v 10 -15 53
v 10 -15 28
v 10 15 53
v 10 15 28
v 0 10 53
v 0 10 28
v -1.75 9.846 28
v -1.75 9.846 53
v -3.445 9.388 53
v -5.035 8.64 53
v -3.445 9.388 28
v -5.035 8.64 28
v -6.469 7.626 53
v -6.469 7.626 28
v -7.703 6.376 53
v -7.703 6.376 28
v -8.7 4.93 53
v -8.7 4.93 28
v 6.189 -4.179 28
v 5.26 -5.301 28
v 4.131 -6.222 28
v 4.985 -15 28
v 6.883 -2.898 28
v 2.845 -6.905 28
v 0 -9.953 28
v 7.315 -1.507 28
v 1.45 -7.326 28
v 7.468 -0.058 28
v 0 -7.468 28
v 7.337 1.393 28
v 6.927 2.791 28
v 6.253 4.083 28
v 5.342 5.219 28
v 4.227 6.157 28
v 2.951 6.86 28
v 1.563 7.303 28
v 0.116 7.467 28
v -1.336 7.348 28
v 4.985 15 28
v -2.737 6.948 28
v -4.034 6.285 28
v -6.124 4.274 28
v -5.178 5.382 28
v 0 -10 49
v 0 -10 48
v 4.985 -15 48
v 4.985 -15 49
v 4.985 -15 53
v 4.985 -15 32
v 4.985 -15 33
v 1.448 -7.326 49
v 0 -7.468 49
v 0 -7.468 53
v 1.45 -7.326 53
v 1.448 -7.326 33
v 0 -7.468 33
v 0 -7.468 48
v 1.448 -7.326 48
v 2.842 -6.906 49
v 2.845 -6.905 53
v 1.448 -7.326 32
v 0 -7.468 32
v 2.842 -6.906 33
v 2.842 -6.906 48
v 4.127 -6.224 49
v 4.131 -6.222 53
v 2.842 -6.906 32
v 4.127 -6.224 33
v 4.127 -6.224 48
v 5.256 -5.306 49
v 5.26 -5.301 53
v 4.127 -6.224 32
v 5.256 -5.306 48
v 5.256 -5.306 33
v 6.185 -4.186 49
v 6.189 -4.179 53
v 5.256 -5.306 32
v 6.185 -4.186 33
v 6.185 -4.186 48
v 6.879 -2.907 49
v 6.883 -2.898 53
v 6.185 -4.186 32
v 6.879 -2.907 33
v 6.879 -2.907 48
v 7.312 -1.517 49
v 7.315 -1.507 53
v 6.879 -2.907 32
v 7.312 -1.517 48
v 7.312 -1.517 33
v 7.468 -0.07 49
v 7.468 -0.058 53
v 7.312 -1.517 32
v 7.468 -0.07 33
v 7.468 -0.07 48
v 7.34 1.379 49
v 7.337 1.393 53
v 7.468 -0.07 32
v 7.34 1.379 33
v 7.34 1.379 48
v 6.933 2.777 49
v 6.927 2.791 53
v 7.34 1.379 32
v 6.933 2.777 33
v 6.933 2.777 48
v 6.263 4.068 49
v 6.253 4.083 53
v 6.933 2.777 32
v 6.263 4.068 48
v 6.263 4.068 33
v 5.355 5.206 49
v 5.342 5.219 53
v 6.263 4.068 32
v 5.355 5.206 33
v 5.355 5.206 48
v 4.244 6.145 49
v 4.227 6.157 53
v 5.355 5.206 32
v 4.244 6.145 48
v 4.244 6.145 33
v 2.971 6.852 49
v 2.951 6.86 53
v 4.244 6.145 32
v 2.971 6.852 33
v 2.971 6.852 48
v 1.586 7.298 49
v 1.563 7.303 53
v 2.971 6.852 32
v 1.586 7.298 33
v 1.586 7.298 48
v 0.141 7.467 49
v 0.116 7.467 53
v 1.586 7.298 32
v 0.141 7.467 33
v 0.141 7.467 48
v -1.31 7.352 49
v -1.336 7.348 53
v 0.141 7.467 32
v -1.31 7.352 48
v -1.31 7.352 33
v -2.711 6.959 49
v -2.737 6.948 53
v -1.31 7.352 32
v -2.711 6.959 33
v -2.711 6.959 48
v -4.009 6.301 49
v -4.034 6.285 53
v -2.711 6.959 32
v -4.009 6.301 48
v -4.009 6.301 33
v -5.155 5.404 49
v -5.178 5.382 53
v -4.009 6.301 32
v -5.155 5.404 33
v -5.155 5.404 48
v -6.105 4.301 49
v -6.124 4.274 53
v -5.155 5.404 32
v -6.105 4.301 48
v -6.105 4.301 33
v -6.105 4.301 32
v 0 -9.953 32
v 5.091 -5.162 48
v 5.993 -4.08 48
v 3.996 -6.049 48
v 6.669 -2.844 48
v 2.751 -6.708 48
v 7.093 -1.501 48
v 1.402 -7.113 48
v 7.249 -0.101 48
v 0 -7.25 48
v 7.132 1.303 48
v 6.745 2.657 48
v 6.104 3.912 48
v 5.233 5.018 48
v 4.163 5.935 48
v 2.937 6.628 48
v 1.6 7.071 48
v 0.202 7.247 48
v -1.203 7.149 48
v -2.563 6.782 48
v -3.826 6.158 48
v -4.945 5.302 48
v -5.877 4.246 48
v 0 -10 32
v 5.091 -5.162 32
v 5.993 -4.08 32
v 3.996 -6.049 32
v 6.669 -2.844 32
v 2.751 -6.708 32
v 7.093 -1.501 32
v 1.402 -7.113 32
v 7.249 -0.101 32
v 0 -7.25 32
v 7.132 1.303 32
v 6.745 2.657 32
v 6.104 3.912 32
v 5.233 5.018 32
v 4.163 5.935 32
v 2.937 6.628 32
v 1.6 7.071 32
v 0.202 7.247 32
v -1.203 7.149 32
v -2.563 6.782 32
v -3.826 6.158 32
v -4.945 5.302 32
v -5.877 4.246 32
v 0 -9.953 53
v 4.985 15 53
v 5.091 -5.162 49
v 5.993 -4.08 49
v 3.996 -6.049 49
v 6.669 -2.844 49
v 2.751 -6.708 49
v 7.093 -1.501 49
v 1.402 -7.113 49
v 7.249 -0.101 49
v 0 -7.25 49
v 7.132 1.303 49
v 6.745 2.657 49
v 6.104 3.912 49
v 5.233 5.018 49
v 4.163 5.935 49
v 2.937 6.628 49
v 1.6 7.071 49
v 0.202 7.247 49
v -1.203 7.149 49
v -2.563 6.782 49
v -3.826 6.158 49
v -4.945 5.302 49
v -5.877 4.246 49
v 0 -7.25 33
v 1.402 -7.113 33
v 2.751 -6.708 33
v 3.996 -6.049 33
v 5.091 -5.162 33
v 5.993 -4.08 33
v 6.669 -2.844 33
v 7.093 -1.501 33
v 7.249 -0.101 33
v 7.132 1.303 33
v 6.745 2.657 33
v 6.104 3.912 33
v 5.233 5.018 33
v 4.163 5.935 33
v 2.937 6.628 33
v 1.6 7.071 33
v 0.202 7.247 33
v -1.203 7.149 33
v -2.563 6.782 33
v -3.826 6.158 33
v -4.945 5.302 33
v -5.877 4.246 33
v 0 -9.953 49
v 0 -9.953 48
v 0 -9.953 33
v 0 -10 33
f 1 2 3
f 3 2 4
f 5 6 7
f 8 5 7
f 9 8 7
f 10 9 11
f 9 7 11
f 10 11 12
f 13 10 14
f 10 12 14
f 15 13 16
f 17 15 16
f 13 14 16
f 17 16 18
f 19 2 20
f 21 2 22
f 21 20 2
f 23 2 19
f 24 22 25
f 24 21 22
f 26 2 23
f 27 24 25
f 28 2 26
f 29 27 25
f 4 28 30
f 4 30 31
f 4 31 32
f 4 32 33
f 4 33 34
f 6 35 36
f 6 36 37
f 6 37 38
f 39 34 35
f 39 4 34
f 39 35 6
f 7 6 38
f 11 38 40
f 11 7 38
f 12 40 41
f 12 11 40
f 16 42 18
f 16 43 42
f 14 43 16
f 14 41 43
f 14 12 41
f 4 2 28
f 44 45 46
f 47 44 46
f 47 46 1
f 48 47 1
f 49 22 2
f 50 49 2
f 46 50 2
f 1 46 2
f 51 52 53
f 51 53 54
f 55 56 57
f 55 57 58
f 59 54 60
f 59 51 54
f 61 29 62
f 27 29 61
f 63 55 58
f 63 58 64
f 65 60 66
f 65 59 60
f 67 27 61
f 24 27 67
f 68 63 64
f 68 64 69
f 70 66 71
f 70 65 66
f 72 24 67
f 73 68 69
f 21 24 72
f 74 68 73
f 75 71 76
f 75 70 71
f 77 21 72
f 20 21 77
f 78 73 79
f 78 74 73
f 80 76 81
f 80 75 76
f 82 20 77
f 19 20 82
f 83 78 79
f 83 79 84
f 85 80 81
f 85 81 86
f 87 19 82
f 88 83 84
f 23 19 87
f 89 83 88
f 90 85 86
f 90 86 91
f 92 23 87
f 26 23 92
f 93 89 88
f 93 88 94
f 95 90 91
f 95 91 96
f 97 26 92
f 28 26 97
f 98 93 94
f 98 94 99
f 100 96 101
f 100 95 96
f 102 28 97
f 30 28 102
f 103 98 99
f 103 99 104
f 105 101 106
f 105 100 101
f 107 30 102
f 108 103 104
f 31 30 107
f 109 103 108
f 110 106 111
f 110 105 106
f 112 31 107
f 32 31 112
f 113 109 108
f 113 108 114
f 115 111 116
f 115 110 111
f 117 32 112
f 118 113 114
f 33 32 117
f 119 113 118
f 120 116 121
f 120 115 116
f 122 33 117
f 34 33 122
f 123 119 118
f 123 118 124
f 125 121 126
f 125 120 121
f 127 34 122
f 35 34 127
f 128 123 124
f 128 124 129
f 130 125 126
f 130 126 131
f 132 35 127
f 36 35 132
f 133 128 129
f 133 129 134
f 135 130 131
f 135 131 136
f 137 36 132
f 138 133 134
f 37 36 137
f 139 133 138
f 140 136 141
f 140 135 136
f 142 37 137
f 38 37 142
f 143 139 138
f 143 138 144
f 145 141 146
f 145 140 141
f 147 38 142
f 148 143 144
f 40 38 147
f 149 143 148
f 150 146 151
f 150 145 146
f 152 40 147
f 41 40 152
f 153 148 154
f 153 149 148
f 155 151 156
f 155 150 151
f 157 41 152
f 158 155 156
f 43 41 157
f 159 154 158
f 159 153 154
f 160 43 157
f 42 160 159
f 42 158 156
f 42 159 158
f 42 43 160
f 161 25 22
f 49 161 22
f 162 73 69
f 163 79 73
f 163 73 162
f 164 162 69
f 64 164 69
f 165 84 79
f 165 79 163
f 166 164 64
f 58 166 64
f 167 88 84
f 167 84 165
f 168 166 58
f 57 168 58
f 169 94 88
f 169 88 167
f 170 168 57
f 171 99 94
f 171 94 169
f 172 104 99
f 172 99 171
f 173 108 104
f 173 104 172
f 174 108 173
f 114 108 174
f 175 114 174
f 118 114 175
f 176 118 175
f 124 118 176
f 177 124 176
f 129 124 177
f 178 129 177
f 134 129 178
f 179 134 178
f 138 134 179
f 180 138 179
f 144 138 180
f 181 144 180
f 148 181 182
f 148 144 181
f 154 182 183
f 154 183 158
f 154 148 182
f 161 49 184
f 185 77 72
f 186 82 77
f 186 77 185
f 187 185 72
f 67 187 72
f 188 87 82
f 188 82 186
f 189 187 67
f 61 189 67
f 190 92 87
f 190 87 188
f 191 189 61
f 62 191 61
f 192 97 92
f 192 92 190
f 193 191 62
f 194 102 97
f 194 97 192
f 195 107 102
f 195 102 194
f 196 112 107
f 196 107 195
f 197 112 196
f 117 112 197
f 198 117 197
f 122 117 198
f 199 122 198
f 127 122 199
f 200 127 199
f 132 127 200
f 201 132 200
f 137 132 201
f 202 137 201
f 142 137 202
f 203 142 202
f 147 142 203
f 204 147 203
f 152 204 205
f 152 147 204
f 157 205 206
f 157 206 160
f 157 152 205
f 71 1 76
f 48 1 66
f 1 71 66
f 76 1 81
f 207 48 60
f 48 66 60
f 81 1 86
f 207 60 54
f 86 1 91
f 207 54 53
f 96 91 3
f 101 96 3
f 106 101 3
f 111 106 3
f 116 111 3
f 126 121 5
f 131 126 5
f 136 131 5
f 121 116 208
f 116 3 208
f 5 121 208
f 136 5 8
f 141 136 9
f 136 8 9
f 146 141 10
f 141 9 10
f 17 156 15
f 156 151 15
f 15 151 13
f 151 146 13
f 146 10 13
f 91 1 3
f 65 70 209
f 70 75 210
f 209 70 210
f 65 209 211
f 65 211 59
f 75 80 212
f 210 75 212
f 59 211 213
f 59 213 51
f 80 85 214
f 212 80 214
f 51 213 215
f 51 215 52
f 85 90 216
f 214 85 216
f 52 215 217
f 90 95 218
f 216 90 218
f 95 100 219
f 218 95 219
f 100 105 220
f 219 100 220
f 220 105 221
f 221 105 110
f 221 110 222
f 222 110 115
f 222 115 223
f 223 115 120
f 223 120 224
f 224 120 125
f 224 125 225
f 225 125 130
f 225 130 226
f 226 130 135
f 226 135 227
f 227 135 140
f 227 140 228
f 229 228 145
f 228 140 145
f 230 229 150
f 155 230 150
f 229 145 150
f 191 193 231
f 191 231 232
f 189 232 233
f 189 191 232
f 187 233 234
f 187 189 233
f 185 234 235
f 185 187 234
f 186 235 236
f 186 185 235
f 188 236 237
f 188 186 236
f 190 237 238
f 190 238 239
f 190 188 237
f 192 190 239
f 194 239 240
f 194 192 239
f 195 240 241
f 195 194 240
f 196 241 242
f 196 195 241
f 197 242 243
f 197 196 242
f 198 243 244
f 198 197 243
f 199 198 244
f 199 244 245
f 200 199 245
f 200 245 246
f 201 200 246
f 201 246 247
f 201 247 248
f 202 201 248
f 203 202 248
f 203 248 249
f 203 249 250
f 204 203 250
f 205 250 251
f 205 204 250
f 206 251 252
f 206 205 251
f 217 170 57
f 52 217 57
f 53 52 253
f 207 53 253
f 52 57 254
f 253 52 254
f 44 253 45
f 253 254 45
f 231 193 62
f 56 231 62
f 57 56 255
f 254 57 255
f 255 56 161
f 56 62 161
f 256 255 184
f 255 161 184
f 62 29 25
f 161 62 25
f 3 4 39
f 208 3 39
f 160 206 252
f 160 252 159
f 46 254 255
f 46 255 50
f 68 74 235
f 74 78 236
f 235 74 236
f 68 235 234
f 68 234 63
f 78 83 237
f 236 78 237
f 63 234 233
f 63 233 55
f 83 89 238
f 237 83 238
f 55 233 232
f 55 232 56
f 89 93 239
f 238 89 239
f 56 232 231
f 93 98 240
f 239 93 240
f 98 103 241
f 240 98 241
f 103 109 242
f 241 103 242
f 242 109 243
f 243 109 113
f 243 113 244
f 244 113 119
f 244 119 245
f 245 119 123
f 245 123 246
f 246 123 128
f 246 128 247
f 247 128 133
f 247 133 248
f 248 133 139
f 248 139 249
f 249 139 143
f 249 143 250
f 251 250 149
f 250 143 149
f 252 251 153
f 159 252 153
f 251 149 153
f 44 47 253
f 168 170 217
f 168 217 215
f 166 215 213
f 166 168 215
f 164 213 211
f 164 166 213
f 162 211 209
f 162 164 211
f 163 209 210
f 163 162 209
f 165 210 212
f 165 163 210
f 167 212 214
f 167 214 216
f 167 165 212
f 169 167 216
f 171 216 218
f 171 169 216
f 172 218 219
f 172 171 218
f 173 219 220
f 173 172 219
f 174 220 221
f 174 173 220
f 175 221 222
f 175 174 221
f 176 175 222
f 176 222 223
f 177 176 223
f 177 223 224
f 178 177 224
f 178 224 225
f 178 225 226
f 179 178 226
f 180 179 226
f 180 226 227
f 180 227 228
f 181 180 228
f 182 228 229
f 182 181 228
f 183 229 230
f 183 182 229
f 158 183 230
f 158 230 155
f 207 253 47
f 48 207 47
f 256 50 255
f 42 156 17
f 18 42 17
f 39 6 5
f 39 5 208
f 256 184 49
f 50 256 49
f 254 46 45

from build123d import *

# Parameters (mm, degrees)
PAD003_DEPTH = 1
PAD004_DEPTH = 1
PAD_DEPTH    = 25


with BuildPart() as pad003:
    # Sketch001 → Pad003 (new body)
    with BuildSketch(Plane.XY.offset(32)):
        with BuildLine():
            Line((-5.8767, 4.245809), (-8.700179, 4.930201))
            ThreePointArc((0, 10), (-5.034779, 8.640081), (-8.700179, 4.930201))
            Line((0, 10), (4.98503, 15))
            Line((10, 15), (4.98503, 15))
            Line((10, -15), (10, 15))
            Line((4.98503, -15), (10, -15))
            Line((0, -10), (4.98503, -15))
            Line((0, -7.25), (0, -10))
            ThreePointArc((0, -7.25), (6.455409, 3.300029), (-5.8767, 4.245809))
        make_face()
    extrude(amount=PAD003_DEPTH)


with BuildPart() as pad004:
    # Sketch002 → Pad004 (new body)
    with BuildSketch(Plane.XY.offset(48)):
        with BuildLine():
            Line((-5.8767, 4.245809), (-8.700179, 4.930201))
            ThreePointArc((0, 10), (-5.034779, 8.640081), (-8.700179, 4.930201))
            Line((0, 10), (4.98503, 15))
            Line((10, 15), (4.98503, 15))
            Line((10, -15), (10, 15))
            Line((4.98503, -15), (10, -15))
            Line((0, -10), (4.98503, -15))
            Line((0, -7.25), (0, -10))
            ThreePointArc((0, -7.25), (6.455409, 3.300029), (-5.8767, 4.245809))
        make_face()
    extrude(amount=PAD004_DEPTH)


with BuildPart() as bearinglodge:
    # Sketch → Pad (new body)
    with BuildSketch(Plane.XY.offset(28)):
        with BuildLine():
            Line((-6.124049, 4.274369), (-8.700179, 4.930201))
            ThreePointArc((0, 10), (-5.034779, 8.640081), (-8.700179, 4.930201))
            Line((0, 10), (4.98503, 15))
            Line((10, 15), (4.98503, 15))
            Line((10, -15), (10, 15))
            Line((4.98503, -15), (10, -15))
            Line((0, -9.952784), (4.98503, -15))
            Line((0, -7.468213), (0, -9.952784))
            ThreePointArc((0, -7.468213), (6.621786, 3.453426), (-6.124049, 4.274369))
        make_face()
    extrude(amount=PAD_DEPTH)

    # Fusion: union Pad003, Pad004
    add(pad003.part)
    add(pad004.part)


solid = bearinglodge.part
